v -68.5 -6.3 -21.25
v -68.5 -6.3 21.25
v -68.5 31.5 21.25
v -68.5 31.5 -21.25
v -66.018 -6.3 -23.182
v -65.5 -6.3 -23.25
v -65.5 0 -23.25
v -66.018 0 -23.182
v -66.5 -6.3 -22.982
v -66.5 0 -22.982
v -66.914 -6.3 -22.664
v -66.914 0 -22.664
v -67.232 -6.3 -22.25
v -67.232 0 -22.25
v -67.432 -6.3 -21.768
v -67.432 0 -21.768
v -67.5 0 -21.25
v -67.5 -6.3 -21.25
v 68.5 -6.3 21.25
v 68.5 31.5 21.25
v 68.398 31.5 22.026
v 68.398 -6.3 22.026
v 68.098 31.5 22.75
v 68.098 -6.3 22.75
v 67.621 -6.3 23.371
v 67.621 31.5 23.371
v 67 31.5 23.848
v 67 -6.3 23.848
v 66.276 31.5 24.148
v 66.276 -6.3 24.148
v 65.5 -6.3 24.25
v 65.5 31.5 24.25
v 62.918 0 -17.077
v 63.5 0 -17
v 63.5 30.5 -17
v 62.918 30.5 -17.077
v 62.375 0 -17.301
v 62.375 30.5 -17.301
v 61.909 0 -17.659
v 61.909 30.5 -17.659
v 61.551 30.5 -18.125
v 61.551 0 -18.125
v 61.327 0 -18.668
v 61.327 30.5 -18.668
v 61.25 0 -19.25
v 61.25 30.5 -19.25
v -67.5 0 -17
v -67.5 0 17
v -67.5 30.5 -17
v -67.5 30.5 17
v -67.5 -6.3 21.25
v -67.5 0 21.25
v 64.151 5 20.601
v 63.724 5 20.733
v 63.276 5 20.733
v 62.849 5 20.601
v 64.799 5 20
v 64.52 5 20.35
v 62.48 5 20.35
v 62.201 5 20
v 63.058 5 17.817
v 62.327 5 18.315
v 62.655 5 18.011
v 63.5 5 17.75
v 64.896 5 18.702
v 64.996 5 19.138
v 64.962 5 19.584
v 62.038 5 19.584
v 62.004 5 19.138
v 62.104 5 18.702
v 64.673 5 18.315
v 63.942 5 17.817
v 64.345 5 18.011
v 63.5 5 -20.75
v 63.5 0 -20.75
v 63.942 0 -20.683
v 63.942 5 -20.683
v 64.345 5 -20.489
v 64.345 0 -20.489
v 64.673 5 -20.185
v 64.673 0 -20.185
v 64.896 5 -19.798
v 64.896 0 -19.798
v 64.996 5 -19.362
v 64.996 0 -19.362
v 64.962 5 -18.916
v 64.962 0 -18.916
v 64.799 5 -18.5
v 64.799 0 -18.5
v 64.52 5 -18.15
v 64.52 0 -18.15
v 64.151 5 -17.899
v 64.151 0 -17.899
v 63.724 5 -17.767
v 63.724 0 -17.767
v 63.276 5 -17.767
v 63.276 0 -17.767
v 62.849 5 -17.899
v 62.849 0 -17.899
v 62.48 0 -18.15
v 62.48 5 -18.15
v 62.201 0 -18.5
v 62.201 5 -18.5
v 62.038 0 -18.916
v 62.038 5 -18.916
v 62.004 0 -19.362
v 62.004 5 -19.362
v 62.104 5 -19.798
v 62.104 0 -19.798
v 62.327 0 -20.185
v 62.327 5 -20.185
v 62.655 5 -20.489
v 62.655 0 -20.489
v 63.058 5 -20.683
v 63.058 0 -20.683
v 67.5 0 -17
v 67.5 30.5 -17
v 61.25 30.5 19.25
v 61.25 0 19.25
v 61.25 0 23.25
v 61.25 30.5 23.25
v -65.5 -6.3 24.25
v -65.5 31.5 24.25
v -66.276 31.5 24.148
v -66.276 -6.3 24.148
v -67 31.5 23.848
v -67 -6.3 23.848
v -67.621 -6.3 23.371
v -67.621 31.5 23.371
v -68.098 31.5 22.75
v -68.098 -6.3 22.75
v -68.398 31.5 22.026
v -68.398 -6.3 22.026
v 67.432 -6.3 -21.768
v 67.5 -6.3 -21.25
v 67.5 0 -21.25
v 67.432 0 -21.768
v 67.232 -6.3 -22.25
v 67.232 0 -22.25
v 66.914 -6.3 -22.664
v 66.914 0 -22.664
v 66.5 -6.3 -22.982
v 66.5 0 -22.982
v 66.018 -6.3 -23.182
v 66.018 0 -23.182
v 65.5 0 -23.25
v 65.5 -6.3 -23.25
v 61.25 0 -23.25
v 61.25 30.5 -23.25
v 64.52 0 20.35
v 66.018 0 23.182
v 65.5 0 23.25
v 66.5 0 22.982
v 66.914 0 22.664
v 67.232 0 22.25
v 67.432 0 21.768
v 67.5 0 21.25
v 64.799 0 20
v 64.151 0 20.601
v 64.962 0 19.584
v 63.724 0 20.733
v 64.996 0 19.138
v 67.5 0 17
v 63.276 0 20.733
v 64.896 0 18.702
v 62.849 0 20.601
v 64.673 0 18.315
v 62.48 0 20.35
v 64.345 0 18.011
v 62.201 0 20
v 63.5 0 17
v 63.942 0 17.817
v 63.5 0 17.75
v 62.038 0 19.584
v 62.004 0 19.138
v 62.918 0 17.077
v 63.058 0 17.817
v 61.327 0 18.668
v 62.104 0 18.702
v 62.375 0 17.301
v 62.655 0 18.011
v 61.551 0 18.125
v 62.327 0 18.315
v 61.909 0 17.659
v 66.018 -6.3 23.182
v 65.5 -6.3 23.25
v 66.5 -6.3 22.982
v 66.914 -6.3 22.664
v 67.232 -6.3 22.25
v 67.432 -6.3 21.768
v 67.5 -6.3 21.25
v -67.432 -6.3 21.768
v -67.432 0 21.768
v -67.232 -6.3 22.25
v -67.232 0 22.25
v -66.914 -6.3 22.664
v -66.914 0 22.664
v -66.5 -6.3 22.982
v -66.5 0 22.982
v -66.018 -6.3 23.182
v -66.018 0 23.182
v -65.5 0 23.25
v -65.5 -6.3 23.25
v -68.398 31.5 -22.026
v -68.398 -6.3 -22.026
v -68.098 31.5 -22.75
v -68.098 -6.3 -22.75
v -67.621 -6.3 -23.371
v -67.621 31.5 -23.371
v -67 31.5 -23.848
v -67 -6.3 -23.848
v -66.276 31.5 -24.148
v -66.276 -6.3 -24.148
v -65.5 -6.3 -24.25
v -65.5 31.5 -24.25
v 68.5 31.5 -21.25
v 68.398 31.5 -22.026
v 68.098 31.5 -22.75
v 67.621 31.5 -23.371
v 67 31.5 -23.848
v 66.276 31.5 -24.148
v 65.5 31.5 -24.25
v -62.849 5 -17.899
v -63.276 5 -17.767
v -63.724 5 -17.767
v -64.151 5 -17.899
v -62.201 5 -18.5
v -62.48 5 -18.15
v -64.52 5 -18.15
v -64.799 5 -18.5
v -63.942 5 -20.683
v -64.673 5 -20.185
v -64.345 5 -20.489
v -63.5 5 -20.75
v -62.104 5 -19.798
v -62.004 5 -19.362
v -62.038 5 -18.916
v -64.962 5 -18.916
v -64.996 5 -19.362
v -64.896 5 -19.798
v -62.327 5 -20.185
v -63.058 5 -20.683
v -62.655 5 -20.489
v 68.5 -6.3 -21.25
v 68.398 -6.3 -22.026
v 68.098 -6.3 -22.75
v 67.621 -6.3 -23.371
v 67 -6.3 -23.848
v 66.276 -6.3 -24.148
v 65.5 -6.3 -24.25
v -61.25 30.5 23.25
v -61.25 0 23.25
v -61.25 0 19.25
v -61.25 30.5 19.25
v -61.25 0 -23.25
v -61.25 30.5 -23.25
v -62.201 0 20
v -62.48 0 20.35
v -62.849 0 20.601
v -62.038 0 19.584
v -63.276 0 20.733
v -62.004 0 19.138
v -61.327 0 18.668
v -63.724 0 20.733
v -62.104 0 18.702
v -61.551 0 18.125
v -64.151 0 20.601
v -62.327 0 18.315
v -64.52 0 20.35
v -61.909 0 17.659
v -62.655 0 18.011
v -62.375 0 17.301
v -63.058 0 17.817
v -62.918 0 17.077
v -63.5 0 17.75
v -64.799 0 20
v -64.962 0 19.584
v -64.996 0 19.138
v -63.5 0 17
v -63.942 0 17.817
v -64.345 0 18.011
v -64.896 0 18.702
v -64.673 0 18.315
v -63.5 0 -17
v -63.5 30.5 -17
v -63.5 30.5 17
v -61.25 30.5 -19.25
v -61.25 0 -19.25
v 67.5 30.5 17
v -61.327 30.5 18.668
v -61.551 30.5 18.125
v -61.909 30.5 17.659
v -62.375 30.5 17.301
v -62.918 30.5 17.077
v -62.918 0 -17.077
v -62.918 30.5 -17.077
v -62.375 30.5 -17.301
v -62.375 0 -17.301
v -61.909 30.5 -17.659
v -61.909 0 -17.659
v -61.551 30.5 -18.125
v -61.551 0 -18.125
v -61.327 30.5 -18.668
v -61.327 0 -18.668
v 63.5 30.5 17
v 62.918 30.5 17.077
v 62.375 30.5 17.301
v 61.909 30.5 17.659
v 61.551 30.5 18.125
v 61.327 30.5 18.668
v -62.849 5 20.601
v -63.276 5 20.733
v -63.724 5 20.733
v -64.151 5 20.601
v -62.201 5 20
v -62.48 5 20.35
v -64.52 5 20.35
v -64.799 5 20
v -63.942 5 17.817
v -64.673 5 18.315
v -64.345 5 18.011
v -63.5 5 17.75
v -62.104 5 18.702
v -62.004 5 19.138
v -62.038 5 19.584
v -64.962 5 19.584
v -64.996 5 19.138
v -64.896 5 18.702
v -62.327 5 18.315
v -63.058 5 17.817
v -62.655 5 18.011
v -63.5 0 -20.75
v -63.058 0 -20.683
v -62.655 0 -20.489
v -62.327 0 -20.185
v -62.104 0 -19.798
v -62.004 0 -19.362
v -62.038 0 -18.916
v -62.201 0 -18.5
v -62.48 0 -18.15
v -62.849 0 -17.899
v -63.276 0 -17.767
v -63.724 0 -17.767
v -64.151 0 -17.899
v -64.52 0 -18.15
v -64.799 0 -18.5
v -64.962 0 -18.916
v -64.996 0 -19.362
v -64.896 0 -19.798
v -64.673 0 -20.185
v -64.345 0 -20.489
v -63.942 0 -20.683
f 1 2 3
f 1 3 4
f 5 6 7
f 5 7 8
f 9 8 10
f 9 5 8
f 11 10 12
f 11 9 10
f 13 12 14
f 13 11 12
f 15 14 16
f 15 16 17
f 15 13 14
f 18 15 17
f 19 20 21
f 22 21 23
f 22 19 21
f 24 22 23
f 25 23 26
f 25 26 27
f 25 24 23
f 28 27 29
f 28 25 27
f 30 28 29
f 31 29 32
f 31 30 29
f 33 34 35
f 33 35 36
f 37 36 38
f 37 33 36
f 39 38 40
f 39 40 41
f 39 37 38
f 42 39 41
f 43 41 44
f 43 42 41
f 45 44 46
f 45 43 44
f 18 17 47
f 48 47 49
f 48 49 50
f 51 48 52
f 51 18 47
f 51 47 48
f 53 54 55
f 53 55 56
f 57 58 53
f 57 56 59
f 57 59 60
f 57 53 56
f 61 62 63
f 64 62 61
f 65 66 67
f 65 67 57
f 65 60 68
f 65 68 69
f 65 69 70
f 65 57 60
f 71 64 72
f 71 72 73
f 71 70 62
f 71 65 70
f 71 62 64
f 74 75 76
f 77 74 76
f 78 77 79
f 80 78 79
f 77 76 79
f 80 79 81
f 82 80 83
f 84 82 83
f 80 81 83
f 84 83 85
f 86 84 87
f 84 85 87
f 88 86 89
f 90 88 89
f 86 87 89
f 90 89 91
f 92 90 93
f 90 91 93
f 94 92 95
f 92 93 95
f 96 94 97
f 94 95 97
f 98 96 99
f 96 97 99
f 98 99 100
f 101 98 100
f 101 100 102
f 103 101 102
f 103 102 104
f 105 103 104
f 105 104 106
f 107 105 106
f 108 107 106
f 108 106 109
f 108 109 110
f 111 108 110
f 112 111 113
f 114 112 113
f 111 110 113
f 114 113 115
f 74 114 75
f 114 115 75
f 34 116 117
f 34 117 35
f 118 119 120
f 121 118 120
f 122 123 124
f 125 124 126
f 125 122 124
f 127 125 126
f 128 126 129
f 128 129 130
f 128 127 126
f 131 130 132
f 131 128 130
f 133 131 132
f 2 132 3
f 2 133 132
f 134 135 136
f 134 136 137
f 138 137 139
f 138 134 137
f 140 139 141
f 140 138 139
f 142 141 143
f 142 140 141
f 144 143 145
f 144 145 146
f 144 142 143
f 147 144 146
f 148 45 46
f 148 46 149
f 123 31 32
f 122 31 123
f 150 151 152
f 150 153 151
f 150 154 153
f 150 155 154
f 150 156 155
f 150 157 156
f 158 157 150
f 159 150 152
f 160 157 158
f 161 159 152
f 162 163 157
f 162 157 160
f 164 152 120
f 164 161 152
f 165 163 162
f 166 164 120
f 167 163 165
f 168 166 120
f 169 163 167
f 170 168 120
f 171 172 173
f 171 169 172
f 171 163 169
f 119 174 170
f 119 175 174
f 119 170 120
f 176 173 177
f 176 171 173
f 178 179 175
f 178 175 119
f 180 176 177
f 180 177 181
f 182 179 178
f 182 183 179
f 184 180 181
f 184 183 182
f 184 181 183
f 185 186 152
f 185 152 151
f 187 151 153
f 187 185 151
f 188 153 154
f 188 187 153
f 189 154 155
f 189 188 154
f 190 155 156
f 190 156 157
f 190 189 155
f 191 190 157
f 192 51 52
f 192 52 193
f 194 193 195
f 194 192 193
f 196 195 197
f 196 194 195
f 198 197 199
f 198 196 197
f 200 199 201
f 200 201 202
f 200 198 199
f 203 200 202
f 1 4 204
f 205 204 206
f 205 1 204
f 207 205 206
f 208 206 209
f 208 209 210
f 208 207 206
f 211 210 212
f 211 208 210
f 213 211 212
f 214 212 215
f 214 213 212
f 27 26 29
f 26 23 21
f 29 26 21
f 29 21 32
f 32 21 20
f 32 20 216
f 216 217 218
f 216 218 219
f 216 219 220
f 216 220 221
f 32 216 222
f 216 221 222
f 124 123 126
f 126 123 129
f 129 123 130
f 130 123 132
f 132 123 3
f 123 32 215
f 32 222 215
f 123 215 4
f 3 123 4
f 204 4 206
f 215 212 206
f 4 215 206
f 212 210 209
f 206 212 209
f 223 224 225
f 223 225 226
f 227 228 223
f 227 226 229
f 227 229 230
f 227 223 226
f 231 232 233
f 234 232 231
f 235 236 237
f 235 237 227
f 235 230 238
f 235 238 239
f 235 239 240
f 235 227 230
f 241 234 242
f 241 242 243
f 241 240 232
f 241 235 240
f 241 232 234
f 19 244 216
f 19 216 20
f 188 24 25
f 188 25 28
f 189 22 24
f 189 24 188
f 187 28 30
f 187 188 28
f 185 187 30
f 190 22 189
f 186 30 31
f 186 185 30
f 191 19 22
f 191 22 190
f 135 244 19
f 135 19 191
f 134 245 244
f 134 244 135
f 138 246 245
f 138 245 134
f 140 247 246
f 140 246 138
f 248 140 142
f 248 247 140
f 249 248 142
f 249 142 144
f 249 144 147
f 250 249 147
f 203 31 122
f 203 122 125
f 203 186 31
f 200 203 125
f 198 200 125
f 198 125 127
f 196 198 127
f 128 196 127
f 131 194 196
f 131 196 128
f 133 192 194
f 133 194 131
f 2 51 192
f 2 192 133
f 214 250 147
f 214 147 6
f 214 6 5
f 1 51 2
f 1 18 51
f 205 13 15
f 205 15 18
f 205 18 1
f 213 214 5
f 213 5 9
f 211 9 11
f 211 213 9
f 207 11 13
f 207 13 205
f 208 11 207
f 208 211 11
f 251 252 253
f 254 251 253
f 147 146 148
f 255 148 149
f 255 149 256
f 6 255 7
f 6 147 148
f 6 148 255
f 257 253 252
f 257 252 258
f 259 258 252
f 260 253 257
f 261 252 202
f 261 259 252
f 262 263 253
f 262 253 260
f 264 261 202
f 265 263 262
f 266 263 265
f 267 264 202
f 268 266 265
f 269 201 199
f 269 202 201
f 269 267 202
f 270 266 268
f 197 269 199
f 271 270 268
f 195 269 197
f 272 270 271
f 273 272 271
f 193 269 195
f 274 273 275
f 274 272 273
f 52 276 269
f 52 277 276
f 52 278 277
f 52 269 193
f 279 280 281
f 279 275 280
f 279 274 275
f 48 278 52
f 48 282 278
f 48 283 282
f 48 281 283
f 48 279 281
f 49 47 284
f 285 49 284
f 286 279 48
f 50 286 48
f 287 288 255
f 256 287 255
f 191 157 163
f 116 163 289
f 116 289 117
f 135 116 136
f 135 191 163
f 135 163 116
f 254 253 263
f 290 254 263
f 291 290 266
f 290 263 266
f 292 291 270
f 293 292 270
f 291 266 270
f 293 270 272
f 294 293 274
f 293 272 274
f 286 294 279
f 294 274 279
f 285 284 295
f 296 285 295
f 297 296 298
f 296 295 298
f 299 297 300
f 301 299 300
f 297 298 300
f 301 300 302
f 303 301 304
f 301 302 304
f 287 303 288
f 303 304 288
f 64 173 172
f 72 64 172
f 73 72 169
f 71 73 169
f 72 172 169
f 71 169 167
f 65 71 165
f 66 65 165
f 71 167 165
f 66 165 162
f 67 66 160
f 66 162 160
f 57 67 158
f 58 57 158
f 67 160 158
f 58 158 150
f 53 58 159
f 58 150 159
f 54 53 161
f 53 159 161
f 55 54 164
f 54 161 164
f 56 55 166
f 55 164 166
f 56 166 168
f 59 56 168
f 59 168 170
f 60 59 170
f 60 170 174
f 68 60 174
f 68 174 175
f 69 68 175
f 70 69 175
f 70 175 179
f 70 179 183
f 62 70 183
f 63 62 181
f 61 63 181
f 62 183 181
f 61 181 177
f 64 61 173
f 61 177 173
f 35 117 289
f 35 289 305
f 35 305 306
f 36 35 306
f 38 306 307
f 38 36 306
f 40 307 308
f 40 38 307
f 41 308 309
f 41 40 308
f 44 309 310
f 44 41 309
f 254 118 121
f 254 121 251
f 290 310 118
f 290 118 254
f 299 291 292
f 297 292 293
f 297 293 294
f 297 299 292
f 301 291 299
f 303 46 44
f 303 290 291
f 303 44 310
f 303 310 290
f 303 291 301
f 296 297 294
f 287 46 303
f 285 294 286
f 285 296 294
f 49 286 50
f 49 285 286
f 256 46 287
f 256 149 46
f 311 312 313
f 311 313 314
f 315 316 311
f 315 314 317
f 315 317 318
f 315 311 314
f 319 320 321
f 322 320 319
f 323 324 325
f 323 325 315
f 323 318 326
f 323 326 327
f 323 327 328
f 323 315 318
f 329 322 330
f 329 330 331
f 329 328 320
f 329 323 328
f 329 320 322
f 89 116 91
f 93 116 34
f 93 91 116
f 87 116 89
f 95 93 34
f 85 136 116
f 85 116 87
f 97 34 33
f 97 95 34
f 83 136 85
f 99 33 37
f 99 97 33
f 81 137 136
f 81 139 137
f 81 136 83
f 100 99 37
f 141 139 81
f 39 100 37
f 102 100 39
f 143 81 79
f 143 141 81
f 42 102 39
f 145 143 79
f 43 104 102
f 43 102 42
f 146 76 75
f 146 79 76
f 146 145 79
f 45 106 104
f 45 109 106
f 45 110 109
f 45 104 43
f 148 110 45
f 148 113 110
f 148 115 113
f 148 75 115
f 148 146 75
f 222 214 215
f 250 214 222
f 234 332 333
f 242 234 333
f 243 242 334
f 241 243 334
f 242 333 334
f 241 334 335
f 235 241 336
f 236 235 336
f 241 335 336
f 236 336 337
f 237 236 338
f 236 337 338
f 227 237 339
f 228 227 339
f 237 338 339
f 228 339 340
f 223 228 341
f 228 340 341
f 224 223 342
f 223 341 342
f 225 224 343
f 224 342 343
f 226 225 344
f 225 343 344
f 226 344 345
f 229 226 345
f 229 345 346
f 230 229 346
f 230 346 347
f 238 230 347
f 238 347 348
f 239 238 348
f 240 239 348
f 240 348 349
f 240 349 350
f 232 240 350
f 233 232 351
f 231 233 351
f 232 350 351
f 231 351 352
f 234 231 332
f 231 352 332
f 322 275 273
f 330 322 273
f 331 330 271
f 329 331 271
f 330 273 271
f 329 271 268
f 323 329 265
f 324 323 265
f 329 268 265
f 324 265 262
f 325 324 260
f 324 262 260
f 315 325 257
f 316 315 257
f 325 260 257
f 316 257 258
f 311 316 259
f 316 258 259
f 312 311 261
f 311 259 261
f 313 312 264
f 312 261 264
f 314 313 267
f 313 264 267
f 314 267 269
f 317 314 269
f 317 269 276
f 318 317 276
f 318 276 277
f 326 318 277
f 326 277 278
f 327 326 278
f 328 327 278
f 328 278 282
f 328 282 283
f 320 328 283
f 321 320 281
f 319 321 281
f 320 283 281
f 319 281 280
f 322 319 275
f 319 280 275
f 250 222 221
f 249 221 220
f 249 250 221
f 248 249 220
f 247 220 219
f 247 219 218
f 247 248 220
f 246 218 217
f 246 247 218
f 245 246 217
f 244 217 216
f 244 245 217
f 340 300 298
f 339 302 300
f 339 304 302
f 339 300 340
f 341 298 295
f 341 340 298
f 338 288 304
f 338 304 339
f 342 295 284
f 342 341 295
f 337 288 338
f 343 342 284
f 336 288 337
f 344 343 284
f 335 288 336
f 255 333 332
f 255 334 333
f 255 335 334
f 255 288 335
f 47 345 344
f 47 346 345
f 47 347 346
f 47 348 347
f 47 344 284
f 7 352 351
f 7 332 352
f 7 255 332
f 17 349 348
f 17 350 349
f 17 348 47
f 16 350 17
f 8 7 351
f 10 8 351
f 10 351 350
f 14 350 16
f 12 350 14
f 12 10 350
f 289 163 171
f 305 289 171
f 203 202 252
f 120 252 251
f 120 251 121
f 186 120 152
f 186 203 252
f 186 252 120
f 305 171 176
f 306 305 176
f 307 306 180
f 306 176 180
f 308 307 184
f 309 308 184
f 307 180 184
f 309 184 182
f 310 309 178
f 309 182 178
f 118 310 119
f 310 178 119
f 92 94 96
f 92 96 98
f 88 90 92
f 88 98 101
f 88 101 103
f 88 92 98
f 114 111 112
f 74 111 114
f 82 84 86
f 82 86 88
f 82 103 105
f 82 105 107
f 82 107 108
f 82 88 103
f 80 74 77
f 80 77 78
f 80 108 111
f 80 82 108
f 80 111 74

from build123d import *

# Parameters (mm, degrees)
BOSS_EXTRUDE1_DEPTH = 31.5
SHELL1_T            = -1
BOSS_EXTRUDE2_DEPTH = 30.5
BOSS_EXTRUDE4_START = -6.3
BOSS_EXTRUDE4_DEPTH = 6.3
SKETCH5_R           = 1.5
CUT_EXTRUDE2_DEPTH  = 5


with BuildPart() as part:
    # Sketch1 → Boss-Extrude1 (new body)
    with BuildSketch(Plane(origin=(0, 0, 0), x_dir=(1, 0, 0), z_dir=(0, 1, 0))):
        with BuildLine():
            Line((-68.5, -21.25), (-68.5, 21.25))
            ThreePointArc((-68.5, 21.25), (-67.621320344, 23.371320344), (-65.5, 24.25))
            Line((-65.5, 24.25), (65.5, 24.25))
            ThreePointArc((65.5, 24.25), (67.621320344, 23.371320344), (68.5, 21.25))
            Line((68.5, 21.25), (68.5, -21.25))
            ThreePointArc((68.5, -21.25), (67.621320344, -23.371320344), (65.5, -24.25))
            Line((65.5, -24.25), (-65.5, -24.25))
            ThreePointArc((-65.5, -24.25), (-67.621320344, -23.371320344), (-68.5, -21.25))
        make_face()
    extrude(amount=BOSS_EXTRUDE1_DEPTH)

    # Shell1
    shell1_openings = [part.faces().sort_by_distance(p)[0] for p in [
        (0, 0, 0),
    ]]
    offset(amount=SHELL1_T, openings=shell1_openings, kind=Kind.INTERSECTION)

    # Sketch2 → Boss-Extrude2 (add)
    with BuildSketch(Plane(origin=(0, 0, 0), x_dir=(1, 0, 0), z_dir=(0, 1, 0))):
        with BuildLine():
            Line((-68.5, 21.25), (-68.5, 17))
            Line((-68.5, 17), (-63.5, 17))
            ThreePointArc((-63.5, 17), (-61.909009742, 17.659009742), (-61.25, 19.25))
            Line((-61.25, 19.25), (-61.25, 24.25))
            Line((-61.25, 24.25), (-65.5, 24.25))
            ThreePointArc((-65.5, 24.25), (-67.621320344, 23.371320344), (-68.5, 21.25))
        make_face()
        with BuildLine():
            Line((-65.5, -24.25), (-61.25, -24.25))
            Line((-61.25, -24.25), (-61.25, -19.25))
            ThreePointArc((-61.25, -19.25), (-61.909009742, -17.659009742), (-63.5, -17))
            Line((-63.5, -17), (-68.5, -17))
            Line((-68.5, -17), (-68.5, -21.25))
            ThreePointArc((-68.5, -21.25), (-67.621320344, -23.371320344), (-65.5, -24.25))
        make_face()
        with BuildLine():
            Line((68.5, 21.25), (68.5, 17))
            Line((68.5, 17), (63.5, 17))
            ThreePointArc((63.5, 17), (61.909009742, 17.659009742), (61.25, 19.25))
            Line((61.25, 19.25), (61.25, 24.25))
            Line((61.25, 24.25), (65.5, 24.25))
            ThreePointArc((65.5, 24.25), (67.621320344, 23.371320344), (68.5, 21.25))
        make_face()
        with BuildLine():
            Line((61.25, -19.25), (61.25, -24.25))
            Line((61.25, -24.25), (65.5, -24.25))
            ThreePointArc((65.5, -24.25), (67.621320344, -23.371320344), (68.5, -21.25))
            Line((68.5, -21.25), (68.5, -17))
            Line((68.5, -17), (63.5, -17))
            ThreePointArc((63.5, -17), (61.909009742, -17.659009742), (61.25, -19.25))
        make_face()
    extrude(amount=BOSS_EXTRUDE2_DEPTH)

    # Sketch4 → Boss-Extrude4 (add)
    with BuildSketch(Plane(origin=(0, 0, 0), x_dir=(1, 0, 0), z_dir=(0, 1, 0)).offset(BOSS_EXTRUDE4_START)):
        with BuildLine():
            Line((-68.5, -21.25), (-68.5, 21.25))
            ThreePointArc((-68.5, 21.25), (-67.621320344, 23.371320344), (-65.5, 24.25))
            Line((-65.5, 24.25), (65.5, 24.25))
            ThreePointArc((65.5, 24.25), (67.621320344, 23.371320344), (68.5, 21.25))
            Line((68.5, 21.25), (68.5, -21.25))
            ThreePointArc((68.5, -21.25), (67.621320344, -23.371320344), (65.5, -24.25))
            Line((65.5, -24.25), (-65.5, -24.25))
            ThreePointArc((-65.5, -24.25), (-67.621320344, -23.371320344), (-68.5, -21.25))
        make_face()
        with BuildLine():
            Line((-65.5, -23.25), (65.5, -23.25))
            ThreePointArc((65.5, -23.25), (66.914213562, -22.664213562), (67.5, -21.25))
            Line((67.5, -21.25), (67.5, 21.25))
            ThreePointArc((67.5, 21.25), (66.914213562, 22.664213562), (65.5, 23.25))
            Line((65.5, 23.25), (-65.5, 23.25))
            ThreePointArc((-65.5, 23.25), (-66.914213562, 22.664213562), (-67.5, 21.25))
            Line((-67.5, 21.25), (-67.5, -21.25))
            ThreePointArc((-67.5, -21.25), (-66.914213562, -22.664213562), (-65.5, -23.25))
        make_face(mode=Mode.SUBTRACT)
    extrude(amount=BOSS_EXTRUDE4_DEPTH)

    # Sketch5 → Cut-Extrude2 (cut)
    with BuildSketch(Plane.XZ):
        with Locations(Location((-63.5, 19.25, 0), (0, 0, 270))):
            Circle(SKETCH5_R)
        with Locations(Location((-63.5, -19.25, 0), (0, 0, 270))):
            Circle(SKETCH5_R)
        with Locations(Location((63.5, 19.25, 0), (0, 0, 270))):
            Circle(SKETCH5_R)
        with Locations(Location((63.5, -19.25, 0), (0, 0, 270))):
            Circle(SKETCH5_R)
    extrude(amount=-CUT_EXTRUDE2_DEPTH, mode=Mode.SUBTRACT)


solid = part.part
